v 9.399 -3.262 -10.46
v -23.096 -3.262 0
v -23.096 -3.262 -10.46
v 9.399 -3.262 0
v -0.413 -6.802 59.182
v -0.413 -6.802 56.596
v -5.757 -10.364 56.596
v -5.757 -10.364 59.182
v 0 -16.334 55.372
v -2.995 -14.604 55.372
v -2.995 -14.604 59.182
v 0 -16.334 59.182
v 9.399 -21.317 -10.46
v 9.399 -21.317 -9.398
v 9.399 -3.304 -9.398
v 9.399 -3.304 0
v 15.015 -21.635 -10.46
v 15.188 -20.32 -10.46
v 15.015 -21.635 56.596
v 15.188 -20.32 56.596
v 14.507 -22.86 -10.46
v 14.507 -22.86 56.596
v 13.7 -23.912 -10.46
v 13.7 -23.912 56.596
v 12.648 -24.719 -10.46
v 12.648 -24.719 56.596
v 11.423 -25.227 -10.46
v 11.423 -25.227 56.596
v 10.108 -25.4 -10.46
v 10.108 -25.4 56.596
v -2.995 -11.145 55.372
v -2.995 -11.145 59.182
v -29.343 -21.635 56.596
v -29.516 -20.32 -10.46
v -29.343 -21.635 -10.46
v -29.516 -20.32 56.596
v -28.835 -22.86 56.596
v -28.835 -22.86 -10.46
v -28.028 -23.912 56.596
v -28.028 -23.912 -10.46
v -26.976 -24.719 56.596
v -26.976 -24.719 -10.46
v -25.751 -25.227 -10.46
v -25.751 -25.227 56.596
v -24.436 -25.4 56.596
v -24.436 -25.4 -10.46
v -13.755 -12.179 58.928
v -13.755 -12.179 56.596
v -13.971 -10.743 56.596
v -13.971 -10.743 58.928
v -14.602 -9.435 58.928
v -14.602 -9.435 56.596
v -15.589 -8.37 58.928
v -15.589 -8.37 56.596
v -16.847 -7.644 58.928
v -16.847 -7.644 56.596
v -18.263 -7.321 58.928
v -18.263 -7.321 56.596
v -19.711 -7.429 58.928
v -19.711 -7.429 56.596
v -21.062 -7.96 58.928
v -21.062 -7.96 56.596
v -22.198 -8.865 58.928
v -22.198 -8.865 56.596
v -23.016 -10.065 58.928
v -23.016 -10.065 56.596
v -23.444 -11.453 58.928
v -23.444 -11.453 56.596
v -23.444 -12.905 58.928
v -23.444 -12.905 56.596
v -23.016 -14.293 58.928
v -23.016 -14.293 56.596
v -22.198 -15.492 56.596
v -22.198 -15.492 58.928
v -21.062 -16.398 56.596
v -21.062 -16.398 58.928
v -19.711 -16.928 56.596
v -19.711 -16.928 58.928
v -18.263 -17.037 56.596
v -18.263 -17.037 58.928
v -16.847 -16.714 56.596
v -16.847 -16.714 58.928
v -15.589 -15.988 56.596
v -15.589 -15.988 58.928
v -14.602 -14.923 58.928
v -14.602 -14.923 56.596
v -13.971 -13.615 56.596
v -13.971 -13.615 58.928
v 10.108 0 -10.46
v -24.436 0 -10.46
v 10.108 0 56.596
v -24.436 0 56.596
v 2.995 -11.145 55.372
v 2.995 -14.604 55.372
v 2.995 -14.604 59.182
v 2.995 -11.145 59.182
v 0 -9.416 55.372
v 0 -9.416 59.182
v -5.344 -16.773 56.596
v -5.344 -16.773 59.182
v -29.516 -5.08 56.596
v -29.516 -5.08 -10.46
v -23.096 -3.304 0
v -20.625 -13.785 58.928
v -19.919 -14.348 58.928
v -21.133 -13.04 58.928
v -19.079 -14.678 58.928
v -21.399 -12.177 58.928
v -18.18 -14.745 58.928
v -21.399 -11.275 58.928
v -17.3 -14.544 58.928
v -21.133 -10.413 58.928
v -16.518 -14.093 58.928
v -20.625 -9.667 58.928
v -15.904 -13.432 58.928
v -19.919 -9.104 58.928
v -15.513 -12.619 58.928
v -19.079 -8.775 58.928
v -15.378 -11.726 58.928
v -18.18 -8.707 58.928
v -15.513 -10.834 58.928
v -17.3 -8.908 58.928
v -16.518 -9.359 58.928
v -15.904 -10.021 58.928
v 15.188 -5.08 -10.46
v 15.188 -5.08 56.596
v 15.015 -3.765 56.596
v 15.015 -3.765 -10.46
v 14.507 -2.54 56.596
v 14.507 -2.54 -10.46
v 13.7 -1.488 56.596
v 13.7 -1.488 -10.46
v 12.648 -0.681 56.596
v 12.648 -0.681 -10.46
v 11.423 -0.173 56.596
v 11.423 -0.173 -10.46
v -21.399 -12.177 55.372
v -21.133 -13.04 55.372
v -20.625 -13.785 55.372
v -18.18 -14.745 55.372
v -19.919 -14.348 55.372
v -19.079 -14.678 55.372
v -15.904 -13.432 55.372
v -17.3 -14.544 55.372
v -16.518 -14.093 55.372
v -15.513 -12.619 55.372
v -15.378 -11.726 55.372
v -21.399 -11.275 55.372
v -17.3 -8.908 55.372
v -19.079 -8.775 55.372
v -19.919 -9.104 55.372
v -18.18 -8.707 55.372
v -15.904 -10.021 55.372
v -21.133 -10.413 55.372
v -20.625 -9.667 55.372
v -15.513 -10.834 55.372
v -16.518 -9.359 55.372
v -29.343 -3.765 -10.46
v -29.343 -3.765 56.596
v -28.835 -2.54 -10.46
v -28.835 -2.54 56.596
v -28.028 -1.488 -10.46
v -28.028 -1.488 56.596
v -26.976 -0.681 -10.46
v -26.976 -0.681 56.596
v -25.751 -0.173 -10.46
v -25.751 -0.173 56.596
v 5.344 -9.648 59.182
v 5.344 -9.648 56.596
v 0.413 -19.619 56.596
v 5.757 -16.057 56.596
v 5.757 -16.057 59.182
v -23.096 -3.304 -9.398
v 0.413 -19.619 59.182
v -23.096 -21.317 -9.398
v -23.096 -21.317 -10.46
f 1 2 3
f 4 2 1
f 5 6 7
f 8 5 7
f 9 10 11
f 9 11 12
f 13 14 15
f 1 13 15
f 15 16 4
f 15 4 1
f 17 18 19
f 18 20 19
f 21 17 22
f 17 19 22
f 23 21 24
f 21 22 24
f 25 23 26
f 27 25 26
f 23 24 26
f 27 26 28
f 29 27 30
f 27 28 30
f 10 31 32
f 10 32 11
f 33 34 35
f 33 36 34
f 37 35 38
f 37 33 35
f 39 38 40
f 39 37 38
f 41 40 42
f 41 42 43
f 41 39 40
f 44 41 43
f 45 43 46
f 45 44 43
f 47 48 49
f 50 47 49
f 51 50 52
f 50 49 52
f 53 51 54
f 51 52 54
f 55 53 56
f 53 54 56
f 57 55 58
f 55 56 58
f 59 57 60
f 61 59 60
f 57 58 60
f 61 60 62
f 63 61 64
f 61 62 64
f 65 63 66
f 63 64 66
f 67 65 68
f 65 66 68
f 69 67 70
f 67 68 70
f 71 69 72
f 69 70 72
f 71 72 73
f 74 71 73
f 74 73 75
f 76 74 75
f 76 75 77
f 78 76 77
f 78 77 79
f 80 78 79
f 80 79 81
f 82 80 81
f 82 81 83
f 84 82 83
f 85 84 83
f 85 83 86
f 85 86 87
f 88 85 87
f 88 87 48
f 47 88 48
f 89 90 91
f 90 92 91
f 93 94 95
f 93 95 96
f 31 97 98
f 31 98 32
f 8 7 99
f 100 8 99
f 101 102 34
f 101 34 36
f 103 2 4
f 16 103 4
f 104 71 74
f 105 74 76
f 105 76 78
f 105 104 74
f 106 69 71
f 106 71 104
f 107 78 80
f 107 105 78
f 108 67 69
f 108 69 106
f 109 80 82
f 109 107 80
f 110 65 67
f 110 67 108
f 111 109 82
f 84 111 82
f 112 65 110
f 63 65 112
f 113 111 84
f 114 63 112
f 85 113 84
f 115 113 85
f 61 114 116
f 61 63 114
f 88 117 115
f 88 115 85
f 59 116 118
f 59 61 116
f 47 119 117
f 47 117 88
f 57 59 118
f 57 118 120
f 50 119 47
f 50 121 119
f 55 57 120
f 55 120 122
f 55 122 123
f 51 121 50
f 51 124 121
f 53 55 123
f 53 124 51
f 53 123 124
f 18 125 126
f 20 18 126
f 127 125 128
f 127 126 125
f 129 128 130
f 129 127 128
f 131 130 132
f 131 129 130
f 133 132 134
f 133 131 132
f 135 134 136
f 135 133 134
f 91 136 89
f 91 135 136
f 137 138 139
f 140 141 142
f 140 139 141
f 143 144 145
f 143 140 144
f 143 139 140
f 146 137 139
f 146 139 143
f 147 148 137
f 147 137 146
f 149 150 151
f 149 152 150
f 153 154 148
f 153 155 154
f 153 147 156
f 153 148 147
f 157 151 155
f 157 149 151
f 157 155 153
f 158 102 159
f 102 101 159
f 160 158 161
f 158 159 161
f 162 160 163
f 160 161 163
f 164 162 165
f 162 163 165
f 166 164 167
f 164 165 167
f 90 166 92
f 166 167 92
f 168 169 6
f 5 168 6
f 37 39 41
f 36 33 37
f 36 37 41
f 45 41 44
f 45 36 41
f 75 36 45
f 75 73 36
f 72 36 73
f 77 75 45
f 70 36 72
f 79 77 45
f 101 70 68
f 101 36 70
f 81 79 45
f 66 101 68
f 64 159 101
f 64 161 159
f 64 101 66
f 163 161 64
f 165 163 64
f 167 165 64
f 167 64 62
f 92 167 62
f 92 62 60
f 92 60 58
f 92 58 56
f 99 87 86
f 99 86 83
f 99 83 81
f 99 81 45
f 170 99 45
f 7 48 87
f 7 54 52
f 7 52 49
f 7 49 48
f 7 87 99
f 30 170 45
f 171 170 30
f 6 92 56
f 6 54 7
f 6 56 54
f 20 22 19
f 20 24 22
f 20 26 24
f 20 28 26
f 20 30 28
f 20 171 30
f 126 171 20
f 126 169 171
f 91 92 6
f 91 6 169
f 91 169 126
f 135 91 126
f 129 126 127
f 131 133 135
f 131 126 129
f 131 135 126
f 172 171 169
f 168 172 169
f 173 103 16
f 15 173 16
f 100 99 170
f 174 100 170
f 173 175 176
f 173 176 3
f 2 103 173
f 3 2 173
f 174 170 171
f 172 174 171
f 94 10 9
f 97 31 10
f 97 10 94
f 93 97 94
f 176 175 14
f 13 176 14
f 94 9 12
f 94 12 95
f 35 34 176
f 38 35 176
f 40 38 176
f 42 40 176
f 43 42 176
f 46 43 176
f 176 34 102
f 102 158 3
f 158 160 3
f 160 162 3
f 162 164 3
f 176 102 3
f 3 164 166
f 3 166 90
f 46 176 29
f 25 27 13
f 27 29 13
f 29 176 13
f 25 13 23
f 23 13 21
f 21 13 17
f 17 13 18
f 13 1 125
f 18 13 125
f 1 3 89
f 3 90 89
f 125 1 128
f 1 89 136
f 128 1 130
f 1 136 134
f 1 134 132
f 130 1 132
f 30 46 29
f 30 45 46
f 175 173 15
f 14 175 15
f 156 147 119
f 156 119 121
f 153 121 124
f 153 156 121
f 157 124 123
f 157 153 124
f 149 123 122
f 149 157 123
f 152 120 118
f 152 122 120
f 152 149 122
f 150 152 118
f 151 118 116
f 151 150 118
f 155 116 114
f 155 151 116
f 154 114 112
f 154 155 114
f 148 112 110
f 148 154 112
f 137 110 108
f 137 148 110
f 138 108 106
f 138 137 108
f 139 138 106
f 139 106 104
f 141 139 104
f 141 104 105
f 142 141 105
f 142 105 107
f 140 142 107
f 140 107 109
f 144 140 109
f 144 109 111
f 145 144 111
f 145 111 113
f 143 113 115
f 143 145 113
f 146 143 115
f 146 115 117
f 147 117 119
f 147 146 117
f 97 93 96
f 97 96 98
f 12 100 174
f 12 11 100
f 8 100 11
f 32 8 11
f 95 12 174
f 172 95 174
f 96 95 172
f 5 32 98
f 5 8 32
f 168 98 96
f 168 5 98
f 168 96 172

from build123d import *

# Parameters (mm, degrees)
F0_W      = 44.703841
F0_H      = 67.055764
F1_DEPTH  = 25.4
F2_R      = 5.08
F3_R      = 4.871573
F4_DEPTH  = 58.928
F6_DEPTH  = 59.182
F7_R      = 3.027464
F8_DEPTH  = 69.85
F10_DEPTH = 63.246
F11_W     = 32.655392
F11_H     = 15.437096
F12_DEPTH = 55.372
F13_W     = 32.494774
F13_H     = 18.05481
F14_DEPTH = 12.192
F15_W     = 36.602098
F15_H     = 18.466117
F16_DEPTH = 9.398


with BuildPart() as f1:
    # F0 (on Front) → F1 (new body)
    with BuildSketch(Plane.XZ):
        with Locations((-7.164082, 23.068326)):
            Rectangle(F0_W, F0_H)
    extrude(amount=F1_DEPTH)

    # F2
    f2_edges = [f1.edges().sort_by_distance(p)[0] for p in [
        (-29.516002, -25.4, 23.068326),
        (15.187839, -25.4, 23.068326),
        (15.187839, 0, 23.068326),
        (-29.516002, 0, 23.068326),
    ]]
    fillet(f2_edges, radius=F2_R)

    # F3 (on Top) → F4 (join)
    with BuildSketch(Plane.XY):
        with Locations((-18.626601, -12.178931)):
            Circle(F3_R)
    extrude(amount=F4_DEPTH)

    # F5 (on Top) → F6 (join)
    with BuildSketch(Plane.XY):
        Polygon((-5.756941, -10.364093), (-5.343609, -16.772998), (0.413332, -19.619495), (5.756941, -16.057087), (5.343609, -9.648181), (-0.413332, -6.801685), align=None)
    extrude(amount=F6_DEPTH)

    # F7 (on Top) → F8 (cut)
    with BuildSketch(Plane.XY):
        with Locations((-18.405765, -11.726255)):
            Circle(F7_R)
    extrude(amount=F8_DEPTH, mode=Mode.SUBTRACT)

    # F9 (on Top) → F10 (cut)
    with BuildSketch(Plane.XY):
        Polygon((2.995406, -11.145309), (0, -9.415911), (-2.995406, -11.145309), (-2.995406, -14.604106), (0, -16.333505), (2.995406, -14.604106), align=None)
    extrude(amount=F10_DEPTH, mode=Mode.SUBTRACT)

    # F11 (on Top) → F12 (join)
    with BuildSketch(Plane.XY):
        with Locations((-6.234212, -13.507458)):
            Rectangle(F11_W, F11_H)
    extrude(amount=F12_DEPTH)

    # F13 (on Top) → F14 (cut)
    with BuildSketch(Plane.XY):
        with Locations((-6.848318, -12.28925)):
            Rectangle(F13_W, F13_H)
    extrude(amount=-F14_DEPTH, mode=Mode.SUBTRACT)

    # F15 (on Top) → F16 (join)
    with BuildSketch(Plane.XY):
        with Locations((-6.621592, -12.536748)):
            Rectangle(F15_W, F15_H)
    extrude(amount=-F16_DEPTH)


solid = f1.part
